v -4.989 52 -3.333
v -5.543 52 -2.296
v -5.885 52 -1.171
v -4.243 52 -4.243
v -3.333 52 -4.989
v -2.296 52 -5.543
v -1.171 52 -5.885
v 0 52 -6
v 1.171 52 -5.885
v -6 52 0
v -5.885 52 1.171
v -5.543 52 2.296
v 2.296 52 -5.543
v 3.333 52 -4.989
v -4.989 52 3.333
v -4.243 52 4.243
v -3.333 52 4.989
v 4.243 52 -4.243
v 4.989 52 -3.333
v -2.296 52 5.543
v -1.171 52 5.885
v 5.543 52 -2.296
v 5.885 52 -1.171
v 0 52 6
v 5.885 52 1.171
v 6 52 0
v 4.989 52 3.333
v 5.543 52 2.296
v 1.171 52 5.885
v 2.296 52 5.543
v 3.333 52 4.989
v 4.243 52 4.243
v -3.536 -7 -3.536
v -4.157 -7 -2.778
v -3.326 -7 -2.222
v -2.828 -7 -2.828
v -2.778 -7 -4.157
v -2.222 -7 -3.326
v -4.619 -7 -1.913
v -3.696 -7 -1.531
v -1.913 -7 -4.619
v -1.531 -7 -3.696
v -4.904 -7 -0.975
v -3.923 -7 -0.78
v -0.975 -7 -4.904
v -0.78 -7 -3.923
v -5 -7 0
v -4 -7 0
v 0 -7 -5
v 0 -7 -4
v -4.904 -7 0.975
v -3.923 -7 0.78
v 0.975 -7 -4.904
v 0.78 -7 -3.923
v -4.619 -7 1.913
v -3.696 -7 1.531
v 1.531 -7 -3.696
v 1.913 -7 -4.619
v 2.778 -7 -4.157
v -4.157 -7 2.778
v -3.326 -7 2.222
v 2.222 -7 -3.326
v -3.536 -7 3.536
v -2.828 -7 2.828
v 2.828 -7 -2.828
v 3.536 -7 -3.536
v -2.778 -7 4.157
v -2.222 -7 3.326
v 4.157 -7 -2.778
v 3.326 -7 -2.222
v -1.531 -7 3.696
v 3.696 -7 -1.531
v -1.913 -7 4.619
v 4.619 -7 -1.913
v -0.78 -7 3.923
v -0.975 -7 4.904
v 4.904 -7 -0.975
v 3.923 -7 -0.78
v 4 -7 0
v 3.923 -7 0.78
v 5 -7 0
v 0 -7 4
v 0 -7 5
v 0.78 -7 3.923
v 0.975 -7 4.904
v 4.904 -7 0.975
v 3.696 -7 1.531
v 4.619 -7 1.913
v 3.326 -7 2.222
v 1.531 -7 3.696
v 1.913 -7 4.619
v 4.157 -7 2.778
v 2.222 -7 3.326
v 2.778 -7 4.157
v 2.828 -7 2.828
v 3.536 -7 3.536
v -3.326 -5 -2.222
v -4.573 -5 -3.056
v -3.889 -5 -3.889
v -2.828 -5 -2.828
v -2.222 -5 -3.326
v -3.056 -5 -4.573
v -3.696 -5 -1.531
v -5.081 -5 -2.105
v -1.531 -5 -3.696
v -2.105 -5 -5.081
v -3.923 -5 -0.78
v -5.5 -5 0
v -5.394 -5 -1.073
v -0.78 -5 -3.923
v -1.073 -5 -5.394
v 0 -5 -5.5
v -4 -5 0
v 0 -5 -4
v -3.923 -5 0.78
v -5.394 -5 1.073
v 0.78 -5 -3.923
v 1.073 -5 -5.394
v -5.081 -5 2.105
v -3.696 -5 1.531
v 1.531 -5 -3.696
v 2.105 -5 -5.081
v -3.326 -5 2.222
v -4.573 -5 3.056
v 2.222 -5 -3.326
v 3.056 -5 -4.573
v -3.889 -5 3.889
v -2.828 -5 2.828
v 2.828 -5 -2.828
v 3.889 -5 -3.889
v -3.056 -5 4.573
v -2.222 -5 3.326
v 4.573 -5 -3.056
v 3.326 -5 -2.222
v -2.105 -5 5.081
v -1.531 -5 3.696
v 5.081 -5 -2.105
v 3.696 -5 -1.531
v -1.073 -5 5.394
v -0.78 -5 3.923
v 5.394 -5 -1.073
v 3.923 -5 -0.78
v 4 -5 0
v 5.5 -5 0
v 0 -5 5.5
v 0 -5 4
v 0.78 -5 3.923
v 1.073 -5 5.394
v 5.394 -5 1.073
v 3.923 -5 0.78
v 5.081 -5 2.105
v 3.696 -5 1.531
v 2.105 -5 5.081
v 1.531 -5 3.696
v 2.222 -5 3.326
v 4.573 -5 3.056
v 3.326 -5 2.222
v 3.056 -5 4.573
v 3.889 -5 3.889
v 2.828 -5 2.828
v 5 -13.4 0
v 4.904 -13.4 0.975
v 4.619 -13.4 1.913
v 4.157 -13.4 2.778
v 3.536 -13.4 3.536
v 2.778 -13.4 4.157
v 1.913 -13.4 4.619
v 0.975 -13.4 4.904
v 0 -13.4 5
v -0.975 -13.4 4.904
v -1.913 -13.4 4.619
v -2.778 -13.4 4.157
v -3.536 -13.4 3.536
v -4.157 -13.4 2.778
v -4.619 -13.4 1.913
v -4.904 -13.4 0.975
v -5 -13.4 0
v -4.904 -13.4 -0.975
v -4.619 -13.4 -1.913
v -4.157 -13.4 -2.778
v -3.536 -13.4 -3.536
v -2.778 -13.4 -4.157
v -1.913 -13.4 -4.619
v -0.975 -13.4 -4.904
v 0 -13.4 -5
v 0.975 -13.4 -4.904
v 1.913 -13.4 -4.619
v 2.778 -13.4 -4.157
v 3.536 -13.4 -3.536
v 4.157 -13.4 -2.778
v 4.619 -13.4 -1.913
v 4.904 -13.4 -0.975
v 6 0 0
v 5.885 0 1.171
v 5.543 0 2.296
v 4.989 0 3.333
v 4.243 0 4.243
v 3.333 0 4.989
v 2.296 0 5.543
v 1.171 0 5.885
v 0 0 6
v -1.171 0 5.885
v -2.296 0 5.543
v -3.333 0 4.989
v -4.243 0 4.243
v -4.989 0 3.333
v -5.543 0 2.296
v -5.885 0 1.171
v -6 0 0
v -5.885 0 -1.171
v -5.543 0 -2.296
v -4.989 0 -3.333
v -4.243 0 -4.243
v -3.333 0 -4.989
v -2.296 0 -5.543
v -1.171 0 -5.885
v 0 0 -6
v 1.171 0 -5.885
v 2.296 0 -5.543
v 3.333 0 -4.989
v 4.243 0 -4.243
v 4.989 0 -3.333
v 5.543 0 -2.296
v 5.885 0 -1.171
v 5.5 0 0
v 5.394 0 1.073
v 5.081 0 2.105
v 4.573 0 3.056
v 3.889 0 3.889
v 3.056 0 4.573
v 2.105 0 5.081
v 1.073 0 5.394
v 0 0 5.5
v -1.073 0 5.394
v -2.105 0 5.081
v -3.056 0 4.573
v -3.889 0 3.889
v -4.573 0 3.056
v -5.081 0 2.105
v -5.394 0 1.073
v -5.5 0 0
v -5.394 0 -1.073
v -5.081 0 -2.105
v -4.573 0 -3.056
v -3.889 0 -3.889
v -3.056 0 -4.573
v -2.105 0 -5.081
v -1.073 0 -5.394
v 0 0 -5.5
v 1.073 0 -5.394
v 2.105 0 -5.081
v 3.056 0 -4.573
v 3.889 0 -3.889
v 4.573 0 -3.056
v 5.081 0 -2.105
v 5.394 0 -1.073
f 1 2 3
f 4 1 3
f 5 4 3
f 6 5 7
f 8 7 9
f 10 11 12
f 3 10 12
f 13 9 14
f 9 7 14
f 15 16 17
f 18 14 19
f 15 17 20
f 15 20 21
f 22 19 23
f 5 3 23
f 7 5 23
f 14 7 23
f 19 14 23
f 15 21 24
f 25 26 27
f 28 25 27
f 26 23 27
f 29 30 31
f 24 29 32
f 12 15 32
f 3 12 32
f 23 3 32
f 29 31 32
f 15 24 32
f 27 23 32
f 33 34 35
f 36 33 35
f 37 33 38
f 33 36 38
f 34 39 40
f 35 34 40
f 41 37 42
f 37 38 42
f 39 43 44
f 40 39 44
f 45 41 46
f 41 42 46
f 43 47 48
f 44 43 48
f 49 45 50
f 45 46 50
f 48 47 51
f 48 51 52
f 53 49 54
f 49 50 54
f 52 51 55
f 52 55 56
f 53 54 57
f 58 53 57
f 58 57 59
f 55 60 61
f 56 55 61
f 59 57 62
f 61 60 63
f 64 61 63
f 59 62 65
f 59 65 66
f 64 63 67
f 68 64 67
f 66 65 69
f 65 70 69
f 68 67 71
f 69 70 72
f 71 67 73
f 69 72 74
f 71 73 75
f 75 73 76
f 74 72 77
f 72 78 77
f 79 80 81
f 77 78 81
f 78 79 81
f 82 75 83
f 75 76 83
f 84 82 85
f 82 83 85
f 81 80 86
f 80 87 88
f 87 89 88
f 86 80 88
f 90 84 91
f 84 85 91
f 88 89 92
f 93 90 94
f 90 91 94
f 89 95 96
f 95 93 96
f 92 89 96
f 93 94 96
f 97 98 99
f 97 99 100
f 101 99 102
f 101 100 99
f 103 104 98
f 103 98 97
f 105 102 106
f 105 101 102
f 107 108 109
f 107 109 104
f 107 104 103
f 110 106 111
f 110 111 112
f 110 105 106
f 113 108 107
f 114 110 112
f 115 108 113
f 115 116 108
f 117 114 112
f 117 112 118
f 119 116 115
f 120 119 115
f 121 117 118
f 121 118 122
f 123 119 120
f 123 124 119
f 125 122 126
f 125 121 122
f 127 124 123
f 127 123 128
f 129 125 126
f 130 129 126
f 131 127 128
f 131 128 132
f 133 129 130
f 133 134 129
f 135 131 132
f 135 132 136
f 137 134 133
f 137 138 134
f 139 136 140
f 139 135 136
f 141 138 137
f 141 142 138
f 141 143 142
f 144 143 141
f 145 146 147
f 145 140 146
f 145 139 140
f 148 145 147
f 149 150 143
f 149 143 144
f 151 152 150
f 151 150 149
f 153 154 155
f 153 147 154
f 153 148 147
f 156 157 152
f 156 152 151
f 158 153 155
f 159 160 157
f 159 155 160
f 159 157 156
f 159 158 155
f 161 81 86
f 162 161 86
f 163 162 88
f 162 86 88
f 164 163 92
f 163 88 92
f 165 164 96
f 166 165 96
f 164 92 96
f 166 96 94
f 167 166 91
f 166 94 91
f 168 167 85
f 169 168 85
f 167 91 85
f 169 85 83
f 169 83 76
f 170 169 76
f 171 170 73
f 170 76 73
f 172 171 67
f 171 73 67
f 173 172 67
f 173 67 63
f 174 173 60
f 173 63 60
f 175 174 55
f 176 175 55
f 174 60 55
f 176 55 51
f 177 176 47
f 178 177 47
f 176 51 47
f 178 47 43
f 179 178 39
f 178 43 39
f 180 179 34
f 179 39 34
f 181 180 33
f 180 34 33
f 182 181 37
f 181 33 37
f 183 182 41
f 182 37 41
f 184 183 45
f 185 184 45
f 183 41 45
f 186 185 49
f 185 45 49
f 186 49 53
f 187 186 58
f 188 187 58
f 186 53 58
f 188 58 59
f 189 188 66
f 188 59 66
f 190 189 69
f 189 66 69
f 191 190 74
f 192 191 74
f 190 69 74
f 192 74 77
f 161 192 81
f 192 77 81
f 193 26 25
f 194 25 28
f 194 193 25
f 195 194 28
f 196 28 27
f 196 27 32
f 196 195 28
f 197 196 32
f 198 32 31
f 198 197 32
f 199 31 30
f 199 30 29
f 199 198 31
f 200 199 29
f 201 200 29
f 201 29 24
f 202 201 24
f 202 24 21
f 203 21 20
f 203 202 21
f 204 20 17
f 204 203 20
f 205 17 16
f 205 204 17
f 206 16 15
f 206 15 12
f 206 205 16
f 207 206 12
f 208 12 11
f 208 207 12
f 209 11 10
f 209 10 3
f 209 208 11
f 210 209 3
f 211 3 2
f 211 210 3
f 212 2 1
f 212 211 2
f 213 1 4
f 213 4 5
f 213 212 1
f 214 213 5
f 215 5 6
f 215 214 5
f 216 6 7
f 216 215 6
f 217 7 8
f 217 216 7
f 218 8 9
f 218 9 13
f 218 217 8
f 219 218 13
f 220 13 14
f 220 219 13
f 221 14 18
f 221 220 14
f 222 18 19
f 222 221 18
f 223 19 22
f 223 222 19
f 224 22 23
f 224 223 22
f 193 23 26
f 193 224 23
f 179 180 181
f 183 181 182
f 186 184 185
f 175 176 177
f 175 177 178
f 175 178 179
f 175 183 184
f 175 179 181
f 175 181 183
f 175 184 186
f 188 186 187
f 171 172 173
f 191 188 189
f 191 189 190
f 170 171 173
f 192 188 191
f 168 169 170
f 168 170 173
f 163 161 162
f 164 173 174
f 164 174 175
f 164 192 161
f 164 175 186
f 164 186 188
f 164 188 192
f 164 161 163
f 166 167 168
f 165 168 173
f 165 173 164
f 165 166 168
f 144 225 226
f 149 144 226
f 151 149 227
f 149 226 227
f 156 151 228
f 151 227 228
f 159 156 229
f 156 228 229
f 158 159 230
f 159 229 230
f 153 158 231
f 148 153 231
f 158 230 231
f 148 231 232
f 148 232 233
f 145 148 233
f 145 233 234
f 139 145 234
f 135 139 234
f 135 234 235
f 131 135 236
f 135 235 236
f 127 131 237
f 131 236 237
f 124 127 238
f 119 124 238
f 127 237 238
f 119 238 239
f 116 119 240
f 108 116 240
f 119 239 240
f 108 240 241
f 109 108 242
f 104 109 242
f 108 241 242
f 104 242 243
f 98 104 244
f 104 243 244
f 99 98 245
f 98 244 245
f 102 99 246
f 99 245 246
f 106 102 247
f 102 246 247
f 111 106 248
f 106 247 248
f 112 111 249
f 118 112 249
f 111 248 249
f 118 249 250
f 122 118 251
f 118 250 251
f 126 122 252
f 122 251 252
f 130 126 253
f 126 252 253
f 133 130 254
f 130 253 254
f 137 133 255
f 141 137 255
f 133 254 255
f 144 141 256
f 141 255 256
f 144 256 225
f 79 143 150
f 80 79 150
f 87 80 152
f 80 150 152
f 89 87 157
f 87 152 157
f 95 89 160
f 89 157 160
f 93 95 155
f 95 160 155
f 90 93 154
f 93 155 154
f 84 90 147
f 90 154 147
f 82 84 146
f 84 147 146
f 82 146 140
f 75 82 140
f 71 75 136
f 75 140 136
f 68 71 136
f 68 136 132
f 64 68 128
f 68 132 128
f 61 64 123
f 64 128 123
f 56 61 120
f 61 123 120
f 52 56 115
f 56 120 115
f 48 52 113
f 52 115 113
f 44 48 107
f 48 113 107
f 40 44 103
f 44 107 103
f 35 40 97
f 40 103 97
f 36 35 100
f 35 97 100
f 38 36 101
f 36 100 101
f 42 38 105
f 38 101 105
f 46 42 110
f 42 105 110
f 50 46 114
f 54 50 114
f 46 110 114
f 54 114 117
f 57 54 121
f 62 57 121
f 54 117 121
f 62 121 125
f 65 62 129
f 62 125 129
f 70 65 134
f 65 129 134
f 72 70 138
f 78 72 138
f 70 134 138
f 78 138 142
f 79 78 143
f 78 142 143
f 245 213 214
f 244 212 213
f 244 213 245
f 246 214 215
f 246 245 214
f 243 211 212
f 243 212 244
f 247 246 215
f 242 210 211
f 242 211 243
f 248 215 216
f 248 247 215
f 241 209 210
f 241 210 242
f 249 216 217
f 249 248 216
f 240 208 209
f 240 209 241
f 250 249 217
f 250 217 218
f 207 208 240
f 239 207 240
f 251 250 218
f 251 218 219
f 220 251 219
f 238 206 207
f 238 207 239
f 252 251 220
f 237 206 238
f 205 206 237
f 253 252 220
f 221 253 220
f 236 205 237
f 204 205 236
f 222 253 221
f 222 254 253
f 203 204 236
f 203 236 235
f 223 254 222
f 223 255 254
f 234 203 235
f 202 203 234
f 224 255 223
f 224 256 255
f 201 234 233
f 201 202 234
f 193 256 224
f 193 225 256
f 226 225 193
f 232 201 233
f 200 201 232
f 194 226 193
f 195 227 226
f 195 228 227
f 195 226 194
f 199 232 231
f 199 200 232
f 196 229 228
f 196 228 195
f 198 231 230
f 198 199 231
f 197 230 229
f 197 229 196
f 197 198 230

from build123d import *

# Parameters (mm, degrees)
F0_R     = 6
F1_DEPTH = 52
F2_R     = 5.5
F3_DEPTH = 5
F4_R     = 4
F5_DEPTH = 2
F6_R     = 5
F7_DEPTH = 6.4


with BuildPart() as f1:
    # F0 (on Front) → F1 (new body)
    with BuildSketch(Plane.XZ):
        Circle(F0_R)
    extrude(amount=-F1_DEPTH)

    # F2 (on face) → F3 (join)
    with BuildSketch(Plane.XZ):
        Circle(F2_R)
    extrude(amount=F3_DEPTH)

    # F4 (on face) → F5 (join)
    with BuildSketch(Plane.XZ.offset(5)):
        Circle(F4_R)
    extrude(amount=F5_DEPTH)

    # F6 (on face) → F7 (join)
    with BuildSketch(Plane.XZ.offset(7)):
        Circle(F6_R)
    extrude(amount=F7_DEPTH)


solid = f1.part
